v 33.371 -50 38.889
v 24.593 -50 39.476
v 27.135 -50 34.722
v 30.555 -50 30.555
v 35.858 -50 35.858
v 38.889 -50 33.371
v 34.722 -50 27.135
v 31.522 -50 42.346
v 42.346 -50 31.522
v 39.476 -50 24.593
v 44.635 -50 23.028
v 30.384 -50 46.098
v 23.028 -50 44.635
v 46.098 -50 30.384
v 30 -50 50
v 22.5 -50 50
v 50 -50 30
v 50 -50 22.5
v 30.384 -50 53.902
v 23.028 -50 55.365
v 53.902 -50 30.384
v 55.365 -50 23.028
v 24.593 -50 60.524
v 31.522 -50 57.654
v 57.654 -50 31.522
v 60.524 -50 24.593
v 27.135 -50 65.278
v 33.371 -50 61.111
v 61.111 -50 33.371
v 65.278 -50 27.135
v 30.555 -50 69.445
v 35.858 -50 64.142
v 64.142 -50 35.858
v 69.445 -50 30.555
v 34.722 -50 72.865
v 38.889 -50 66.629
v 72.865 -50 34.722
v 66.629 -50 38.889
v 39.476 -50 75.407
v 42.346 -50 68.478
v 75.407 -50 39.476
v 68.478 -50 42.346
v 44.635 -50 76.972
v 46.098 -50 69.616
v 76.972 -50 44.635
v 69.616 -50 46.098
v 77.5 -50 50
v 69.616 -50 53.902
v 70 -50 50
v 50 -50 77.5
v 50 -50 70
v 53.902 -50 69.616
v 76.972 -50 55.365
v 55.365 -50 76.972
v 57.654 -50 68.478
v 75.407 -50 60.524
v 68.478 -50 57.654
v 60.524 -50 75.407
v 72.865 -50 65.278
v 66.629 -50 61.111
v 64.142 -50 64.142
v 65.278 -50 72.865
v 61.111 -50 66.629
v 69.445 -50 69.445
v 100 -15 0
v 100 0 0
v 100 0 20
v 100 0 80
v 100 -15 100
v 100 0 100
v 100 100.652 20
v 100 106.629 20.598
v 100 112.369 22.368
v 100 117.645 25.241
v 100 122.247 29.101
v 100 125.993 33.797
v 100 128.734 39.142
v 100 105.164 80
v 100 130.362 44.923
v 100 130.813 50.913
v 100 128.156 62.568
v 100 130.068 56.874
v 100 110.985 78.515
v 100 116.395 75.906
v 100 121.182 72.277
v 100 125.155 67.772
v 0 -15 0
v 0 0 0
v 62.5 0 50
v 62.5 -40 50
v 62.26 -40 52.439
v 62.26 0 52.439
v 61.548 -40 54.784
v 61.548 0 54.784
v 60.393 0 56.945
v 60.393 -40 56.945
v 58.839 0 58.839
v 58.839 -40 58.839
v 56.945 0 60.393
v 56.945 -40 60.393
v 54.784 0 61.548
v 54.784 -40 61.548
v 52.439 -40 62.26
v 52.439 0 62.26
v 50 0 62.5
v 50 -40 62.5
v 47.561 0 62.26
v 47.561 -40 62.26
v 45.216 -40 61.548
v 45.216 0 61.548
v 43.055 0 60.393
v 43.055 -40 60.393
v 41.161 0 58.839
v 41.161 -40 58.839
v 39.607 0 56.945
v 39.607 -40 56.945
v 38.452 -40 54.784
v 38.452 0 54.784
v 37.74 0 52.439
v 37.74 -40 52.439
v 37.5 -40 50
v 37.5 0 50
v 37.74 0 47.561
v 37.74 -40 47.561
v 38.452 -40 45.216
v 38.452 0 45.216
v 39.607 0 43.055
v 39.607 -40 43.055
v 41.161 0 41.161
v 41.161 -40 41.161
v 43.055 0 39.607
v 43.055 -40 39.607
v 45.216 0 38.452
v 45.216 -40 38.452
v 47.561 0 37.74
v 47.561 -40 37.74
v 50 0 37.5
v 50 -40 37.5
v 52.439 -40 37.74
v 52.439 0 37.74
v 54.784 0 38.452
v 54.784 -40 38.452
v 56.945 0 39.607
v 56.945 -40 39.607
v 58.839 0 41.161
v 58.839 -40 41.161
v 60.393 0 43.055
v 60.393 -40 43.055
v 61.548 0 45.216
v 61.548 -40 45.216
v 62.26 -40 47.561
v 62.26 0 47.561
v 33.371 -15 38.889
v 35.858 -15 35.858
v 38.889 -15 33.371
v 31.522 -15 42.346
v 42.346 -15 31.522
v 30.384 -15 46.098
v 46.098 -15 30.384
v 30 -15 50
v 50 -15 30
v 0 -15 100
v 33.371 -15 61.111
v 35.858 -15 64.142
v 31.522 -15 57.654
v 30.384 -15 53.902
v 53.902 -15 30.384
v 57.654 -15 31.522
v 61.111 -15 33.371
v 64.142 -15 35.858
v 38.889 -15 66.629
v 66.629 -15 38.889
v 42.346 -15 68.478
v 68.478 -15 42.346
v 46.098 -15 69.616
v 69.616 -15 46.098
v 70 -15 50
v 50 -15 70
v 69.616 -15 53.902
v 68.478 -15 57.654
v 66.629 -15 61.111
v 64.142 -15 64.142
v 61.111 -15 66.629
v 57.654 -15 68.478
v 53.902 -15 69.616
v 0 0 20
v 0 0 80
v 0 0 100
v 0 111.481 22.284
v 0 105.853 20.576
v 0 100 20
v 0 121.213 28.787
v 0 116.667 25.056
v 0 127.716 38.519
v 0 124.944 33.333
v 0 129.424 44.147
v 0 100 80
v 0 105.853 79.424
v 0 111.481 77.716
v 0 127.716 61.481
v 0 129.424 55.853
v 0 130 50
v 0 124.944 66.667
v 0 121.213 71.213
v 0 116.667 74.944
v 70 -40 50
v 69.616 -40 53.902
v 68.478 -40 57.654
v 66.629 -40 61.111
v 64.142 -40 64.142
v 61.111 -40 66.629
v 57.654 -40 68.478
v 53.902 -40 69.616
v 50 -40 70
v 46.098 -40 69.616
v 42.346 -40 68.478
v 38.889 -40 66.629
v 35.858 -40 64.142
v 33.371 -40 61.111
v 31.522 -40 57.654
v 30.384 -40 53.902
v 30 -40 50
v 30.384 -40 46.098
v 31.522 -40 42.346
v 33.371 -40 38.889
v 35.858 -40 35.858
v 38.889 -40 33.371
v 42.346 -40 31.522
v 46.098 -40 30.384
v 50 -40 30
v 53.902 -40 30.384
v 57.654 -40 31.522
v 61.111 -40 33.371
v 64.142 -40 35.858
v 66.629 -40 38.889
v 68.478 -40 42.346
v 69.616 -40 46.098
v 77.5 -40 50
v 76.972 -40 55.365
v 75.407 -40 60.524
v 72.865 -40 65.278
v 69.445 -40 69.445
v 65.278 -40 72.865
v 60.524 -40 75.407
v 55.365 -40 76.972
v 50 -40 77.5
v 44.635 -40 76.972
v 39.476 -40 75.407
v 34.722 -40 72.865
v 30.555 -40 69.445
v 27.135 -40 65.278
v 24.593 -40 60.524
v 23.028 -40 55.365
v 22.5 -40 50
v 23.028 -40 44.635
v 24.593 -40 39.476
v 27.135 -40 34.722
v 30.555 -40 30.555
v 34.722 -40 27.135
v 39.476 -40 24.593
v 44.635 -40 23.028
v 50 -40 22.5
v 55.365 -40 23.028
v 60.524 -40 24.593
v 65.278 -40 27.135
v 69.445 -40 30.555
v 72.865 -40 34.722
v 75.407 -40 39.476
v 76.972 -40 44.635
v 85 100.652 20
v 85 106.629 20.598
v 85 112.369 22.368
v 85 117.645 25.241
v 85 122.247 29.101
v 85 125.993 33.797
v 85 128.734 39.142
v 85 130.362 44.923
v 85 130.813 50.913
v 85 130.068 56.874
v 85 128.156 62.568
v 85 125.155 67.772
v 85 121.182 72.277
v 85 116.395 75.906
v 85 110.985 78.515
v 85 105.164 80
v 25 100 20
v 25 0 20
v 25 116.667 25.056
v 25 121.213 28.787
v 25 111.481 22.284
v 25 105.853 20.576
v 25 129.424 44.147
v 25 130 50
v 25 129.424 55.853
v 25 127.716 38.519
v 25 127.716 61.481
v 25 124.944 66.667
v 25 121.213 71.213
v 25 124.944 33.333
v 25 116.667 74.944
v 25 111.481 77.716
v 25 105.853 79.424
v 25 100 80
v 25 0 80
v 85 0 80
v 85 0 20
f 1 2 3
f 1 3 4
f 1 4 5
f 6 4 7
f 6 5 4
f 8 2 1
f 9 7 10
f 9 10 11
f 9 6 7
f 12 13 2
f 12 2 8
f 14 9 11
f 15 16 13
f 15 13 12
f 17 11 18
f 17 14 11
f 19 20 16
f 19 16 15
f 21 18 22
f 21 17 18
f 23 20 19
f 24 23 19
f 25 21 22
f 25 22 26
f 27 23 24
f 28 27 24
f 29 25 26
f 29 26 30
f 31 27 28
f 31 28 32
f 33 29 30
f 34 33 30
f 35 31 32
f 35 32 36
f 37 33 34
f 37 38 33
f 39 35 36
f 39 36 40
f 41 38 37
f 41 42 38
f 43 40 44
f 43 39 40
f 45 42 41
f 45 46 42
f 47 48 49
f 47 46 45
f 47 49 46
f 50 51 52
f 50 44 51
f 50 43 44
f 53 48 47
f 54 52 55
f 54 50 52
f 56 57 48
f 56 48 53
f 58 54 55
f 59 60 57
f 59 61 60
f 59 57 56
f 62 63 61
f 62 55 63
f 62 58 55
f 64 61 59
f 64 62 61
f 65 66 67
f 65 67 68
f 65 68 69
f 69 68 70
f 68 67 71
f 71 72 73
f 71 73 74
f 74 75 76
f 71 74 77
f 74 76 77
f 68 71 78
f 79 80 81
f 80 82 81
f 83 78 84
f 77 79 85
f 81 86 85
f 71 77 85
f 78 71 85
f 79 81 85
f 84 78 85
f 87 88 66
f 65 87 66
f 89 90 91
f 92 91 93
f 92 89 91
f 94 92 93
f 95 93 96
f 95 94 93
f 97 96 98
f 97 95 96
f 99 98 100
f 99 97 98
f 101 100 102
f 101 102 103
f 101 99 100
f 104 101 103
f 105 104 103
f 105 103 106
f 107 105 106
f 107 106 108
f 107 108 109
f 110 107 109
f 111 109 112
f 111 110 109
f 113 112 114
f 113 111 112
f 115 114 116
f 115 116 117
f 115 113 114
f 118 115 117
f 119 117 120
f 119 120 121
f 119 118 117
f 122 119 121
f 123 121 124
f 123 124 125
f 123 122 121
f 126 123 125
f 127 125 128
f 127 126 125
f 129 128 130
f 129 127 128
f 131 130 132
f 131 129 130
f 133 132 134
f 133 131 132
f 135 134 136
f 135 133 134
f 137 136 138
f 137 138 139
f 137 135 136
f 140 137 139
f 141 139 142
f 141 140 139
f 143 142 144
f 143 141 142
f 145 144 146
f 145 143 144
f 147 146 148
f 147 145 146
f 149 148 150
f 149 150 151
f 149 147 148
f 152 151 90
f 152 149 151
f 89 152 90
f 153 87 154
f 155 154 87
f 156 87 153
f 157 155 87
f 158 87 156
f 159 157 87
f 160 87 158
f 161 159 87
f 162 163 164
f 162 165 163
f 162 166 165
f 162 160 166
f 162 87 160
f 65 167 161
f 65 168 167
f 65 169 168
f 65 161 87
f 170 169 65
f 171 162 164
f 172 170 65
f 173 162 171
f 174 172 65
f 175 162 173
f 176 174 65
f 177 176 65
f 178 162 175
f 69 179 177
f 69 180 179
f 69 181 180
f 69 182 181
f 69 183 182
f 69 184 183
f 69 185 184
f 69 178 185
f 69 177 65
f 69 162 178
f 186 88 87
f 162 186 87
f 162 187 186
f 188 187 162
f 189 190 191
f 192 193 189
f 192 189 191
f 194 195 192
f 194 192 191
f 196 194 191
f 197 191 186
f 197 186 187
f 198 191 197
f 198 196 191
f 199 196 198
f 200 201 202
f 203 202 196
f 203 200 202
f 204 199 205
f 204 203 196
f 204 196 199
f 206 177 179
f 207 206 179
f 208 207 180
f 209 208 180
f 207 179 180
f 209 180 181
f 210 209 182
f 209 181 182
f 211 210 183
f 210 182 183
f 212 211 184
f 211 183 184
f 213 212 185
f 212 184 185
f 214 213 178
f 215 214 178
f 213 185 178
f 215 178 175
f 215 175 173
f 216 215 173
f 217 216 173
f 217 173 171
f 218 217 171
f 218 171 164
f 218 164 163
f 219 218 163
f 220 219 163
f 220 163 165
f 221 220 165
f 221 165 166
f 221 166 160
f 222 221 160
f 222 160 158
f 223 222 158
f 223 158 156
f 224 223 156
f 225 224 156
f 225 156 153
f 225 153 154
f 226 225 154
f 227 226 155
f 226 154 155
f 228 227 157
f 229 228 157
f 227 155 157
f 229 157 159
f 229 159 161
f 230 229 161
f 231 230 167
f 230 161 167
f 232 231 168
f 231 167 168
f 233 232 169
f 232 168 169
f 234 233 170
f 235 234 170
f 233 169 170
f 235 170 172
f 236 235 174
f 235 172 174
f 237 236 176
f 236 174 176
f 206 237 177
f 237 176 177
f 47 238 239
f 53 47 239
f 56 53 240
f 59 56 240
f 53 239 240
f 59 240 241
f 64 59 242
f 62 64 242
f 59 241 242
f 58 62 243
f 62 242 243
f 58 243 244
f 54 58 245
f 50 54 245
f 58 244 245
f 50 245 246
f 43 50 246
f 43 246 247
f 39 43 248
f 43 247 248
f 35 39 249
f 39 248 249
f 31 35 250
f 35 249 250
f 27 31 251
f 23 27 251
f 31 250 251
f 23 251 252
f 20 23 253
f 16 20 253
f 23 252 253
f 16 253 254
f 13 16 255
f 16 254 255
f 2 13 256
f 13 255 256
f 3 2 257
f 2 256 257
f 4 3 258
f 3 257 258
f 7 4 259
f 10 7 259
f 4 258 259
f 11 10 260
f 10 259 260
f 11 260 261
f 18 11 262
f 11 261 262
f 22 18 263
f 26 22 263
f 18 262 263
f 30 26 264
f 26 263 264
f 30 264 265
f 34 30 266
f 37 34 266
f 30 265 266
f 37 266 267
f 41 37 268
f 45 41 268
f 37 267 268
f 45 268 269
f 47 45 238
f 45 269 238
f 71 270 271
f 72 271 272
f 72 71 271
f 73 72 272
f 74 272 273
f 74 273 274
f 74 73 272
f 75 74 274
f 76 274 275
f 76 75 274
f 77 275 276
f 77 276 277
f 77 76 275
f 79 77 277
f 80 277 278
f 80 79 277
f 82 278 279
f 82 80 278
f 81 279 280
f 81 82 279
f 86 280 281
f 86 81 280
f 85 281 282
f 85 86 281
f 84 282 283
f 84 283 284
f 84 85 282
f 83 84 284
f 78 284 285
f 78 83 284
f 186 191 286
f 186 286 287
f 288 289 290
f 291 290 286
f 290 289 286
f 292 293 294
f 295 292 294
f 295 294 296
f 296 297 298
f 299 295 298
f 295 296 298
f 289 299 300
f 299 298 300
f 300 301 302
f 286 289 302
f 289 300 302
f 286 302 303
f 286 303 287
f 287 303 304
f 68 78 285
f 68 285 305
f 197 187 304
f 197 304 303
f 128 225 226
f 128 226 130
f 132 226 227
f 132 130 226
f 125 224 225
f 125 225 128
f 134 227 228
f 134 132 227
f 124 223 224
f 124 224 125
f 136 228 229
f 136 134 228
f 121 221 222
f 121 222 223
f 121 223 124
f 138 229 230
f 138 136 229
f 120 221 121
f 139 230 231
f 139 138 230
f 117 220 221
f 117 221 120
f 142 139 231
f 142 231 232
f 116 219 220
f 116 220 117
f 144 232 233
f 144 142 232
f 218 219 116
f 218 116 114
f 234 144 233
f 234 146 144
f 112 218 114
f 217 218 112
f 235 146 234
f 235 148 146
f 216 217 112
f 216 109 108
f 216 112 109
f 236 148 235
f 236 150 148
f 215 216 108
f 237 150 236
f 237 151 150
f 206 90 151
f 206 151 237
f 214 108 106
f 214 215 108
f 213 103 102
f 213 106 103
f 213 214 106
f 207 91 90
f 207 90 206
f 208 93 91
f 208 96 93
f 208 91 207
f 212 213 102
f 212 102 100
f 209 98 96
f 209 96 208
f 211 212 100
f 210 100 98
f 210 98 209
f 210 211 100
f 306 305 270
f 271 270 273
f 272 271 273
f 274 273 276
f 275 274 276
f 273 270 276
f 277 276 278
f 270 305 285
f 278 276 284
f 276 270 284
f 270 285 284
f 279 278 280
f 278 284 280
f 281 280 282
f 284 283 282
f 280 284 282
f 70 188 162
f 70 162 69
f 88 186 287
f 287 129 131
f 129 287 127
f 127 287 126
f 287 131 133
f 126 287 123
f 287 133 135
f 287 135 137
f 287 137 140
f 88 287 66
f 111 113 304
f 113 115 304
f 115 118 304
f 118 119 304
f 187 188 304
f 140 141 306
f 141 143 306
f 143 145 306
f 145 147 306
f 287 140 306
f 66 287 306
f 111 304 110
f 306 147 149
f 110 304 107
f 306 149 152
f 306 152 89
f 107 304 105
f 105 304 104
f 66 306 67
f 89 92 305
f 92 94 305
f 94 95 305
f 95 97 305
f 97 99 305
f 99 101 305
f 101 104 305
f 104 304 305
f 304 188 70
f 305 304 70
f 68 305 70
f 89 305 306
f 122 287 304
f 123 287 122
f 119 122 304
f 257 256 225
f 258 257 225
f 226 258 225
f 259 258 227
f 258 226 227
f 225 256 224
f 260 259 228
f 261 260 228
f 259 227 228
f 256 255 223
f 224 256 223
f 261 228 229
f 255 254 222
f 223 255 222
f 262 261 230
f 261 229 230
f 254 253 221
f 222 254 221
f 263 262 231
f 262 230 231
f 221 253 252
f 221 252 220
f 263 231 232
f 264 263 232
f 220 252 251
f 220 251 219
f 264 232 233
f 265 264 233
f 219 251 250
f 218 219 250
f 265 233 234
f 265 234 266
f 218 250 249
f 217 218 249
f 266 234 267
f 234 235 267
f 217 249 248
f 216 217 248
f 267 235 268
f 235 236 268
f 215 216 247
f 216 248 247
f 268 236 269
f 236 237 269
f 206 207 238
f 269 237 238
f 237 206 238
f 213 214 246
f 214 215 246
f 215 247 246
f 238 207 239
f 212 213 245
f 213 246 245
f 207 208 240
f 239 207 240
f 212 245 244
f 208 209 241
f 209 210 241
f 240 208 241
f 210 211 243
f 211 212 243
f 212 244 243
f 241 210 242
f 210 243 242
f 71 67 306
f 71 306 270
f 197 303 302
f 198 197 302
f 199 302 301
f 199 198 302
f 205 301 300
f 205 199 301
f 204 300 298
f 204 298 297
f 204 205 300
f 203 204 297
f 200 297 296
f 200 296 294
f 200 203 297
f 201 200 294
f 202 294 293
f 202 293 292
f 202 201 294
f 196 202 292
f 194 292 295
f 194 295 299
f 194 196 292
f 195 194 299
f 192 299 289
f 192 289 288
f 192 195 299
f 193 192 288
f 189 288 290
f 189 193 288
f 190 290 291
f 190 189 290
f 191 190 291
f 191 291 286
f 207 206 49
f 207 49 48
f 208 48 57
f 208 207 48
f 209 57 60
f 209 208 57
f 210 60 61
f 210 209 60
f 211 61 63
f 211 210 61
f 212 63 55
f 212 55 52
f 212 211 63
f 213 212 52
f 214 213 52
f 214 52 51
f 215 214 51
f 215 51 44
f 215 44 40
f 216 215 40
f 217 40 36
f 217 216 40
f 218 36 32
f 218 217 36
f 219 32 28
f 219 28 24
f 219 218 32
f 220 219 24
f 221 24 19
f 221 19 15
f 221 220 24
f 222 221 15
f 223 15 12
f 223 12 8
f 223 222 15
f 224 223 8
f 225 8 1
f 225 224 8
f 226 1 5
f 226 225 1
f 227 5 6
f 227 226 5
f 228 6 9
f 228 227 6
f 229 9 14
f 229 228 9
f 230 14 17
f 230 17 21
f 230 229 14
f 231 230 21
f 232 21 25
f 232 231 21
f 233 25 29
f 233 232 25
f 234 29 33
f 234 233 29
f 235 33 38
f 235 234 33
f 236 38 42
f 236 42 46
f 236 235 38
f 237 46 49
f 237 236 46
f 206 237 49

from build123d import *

# Parameters (mm, degrees)
F0_W     = 100
F0_H     = 100
F0_R     = 20
F1_DEPTH = 15
F0_R_2   = 12.5
F2_DEPTH = 40
F3_R     = 27.5
F3_R_2   = 20
F4_DEPTH = 10
F6_DEPTH = 15
F8_DEPTH = 25


with BuildPart() as f1:
    # F0 (on Front) → F1 (new body)
    with BuildSketch(Plane.XZ):
        with Locations((50, 50)):
            Rectangle(F0_W, F0_H)
        with Locations((50, 50)):
            Circle(F0_R, mode=Mode.SUBTRACT)
    extrude(amount=F1_DEPTH)

    # F0 (on Front) → F2 (join)
    with BuildSketch(Plane.XZ):
        with Locations((50, 50)):
            Circle(F0_R)
        with Locations((50, 50)):
            Circle(F0_R_2, mode=Mode.SUBTRACT)
    extrude(amount=F2_DEPTH)

    # F3 (on face) → F4 (join)
    with BuildSketch(Plane.XZ.offset(40)):
        with Locations((50, 50)):
            Circle(F3_R)
        with Locations((50, 50)):
            Circle(F3_R_2, mode=Mode.SUBTRACT)
    extrude(amount=F4_DEPTH)

    # F5 (on face) → F6 (join)
    with BuildSketch(Plane.YZ.offset(100)):
        with BuildLine():
            Line((105.164453, 80), (0, 80))
            Line((0, 80), (0, 20))
            Line((0, 20), (100.652225, 20))
            ThreePointArc((100.652225, 20), (130.73694, 47.907183), (105.164453, 80))
        make_face()
    extrude(amount=-F6_DEPTH)

    # F7 (on face) → F8 (join)
    with BuildSketch(Plane(origin=(0, 0, 0), x_dir=(0, -1, 0), z_dir=(-1, 0, 0))):
        with BuildLine():
            Line((0, 20), (0, 80))
            Line((0, 80), (-100, 80))
            ThreePointArc((-100, 80), (-130, 50), (-100, 20))
            Line((-100, 20), (0, 20))
        make_face()
    extrude(amount=-F8_DEPTH)


solid = f1.part
